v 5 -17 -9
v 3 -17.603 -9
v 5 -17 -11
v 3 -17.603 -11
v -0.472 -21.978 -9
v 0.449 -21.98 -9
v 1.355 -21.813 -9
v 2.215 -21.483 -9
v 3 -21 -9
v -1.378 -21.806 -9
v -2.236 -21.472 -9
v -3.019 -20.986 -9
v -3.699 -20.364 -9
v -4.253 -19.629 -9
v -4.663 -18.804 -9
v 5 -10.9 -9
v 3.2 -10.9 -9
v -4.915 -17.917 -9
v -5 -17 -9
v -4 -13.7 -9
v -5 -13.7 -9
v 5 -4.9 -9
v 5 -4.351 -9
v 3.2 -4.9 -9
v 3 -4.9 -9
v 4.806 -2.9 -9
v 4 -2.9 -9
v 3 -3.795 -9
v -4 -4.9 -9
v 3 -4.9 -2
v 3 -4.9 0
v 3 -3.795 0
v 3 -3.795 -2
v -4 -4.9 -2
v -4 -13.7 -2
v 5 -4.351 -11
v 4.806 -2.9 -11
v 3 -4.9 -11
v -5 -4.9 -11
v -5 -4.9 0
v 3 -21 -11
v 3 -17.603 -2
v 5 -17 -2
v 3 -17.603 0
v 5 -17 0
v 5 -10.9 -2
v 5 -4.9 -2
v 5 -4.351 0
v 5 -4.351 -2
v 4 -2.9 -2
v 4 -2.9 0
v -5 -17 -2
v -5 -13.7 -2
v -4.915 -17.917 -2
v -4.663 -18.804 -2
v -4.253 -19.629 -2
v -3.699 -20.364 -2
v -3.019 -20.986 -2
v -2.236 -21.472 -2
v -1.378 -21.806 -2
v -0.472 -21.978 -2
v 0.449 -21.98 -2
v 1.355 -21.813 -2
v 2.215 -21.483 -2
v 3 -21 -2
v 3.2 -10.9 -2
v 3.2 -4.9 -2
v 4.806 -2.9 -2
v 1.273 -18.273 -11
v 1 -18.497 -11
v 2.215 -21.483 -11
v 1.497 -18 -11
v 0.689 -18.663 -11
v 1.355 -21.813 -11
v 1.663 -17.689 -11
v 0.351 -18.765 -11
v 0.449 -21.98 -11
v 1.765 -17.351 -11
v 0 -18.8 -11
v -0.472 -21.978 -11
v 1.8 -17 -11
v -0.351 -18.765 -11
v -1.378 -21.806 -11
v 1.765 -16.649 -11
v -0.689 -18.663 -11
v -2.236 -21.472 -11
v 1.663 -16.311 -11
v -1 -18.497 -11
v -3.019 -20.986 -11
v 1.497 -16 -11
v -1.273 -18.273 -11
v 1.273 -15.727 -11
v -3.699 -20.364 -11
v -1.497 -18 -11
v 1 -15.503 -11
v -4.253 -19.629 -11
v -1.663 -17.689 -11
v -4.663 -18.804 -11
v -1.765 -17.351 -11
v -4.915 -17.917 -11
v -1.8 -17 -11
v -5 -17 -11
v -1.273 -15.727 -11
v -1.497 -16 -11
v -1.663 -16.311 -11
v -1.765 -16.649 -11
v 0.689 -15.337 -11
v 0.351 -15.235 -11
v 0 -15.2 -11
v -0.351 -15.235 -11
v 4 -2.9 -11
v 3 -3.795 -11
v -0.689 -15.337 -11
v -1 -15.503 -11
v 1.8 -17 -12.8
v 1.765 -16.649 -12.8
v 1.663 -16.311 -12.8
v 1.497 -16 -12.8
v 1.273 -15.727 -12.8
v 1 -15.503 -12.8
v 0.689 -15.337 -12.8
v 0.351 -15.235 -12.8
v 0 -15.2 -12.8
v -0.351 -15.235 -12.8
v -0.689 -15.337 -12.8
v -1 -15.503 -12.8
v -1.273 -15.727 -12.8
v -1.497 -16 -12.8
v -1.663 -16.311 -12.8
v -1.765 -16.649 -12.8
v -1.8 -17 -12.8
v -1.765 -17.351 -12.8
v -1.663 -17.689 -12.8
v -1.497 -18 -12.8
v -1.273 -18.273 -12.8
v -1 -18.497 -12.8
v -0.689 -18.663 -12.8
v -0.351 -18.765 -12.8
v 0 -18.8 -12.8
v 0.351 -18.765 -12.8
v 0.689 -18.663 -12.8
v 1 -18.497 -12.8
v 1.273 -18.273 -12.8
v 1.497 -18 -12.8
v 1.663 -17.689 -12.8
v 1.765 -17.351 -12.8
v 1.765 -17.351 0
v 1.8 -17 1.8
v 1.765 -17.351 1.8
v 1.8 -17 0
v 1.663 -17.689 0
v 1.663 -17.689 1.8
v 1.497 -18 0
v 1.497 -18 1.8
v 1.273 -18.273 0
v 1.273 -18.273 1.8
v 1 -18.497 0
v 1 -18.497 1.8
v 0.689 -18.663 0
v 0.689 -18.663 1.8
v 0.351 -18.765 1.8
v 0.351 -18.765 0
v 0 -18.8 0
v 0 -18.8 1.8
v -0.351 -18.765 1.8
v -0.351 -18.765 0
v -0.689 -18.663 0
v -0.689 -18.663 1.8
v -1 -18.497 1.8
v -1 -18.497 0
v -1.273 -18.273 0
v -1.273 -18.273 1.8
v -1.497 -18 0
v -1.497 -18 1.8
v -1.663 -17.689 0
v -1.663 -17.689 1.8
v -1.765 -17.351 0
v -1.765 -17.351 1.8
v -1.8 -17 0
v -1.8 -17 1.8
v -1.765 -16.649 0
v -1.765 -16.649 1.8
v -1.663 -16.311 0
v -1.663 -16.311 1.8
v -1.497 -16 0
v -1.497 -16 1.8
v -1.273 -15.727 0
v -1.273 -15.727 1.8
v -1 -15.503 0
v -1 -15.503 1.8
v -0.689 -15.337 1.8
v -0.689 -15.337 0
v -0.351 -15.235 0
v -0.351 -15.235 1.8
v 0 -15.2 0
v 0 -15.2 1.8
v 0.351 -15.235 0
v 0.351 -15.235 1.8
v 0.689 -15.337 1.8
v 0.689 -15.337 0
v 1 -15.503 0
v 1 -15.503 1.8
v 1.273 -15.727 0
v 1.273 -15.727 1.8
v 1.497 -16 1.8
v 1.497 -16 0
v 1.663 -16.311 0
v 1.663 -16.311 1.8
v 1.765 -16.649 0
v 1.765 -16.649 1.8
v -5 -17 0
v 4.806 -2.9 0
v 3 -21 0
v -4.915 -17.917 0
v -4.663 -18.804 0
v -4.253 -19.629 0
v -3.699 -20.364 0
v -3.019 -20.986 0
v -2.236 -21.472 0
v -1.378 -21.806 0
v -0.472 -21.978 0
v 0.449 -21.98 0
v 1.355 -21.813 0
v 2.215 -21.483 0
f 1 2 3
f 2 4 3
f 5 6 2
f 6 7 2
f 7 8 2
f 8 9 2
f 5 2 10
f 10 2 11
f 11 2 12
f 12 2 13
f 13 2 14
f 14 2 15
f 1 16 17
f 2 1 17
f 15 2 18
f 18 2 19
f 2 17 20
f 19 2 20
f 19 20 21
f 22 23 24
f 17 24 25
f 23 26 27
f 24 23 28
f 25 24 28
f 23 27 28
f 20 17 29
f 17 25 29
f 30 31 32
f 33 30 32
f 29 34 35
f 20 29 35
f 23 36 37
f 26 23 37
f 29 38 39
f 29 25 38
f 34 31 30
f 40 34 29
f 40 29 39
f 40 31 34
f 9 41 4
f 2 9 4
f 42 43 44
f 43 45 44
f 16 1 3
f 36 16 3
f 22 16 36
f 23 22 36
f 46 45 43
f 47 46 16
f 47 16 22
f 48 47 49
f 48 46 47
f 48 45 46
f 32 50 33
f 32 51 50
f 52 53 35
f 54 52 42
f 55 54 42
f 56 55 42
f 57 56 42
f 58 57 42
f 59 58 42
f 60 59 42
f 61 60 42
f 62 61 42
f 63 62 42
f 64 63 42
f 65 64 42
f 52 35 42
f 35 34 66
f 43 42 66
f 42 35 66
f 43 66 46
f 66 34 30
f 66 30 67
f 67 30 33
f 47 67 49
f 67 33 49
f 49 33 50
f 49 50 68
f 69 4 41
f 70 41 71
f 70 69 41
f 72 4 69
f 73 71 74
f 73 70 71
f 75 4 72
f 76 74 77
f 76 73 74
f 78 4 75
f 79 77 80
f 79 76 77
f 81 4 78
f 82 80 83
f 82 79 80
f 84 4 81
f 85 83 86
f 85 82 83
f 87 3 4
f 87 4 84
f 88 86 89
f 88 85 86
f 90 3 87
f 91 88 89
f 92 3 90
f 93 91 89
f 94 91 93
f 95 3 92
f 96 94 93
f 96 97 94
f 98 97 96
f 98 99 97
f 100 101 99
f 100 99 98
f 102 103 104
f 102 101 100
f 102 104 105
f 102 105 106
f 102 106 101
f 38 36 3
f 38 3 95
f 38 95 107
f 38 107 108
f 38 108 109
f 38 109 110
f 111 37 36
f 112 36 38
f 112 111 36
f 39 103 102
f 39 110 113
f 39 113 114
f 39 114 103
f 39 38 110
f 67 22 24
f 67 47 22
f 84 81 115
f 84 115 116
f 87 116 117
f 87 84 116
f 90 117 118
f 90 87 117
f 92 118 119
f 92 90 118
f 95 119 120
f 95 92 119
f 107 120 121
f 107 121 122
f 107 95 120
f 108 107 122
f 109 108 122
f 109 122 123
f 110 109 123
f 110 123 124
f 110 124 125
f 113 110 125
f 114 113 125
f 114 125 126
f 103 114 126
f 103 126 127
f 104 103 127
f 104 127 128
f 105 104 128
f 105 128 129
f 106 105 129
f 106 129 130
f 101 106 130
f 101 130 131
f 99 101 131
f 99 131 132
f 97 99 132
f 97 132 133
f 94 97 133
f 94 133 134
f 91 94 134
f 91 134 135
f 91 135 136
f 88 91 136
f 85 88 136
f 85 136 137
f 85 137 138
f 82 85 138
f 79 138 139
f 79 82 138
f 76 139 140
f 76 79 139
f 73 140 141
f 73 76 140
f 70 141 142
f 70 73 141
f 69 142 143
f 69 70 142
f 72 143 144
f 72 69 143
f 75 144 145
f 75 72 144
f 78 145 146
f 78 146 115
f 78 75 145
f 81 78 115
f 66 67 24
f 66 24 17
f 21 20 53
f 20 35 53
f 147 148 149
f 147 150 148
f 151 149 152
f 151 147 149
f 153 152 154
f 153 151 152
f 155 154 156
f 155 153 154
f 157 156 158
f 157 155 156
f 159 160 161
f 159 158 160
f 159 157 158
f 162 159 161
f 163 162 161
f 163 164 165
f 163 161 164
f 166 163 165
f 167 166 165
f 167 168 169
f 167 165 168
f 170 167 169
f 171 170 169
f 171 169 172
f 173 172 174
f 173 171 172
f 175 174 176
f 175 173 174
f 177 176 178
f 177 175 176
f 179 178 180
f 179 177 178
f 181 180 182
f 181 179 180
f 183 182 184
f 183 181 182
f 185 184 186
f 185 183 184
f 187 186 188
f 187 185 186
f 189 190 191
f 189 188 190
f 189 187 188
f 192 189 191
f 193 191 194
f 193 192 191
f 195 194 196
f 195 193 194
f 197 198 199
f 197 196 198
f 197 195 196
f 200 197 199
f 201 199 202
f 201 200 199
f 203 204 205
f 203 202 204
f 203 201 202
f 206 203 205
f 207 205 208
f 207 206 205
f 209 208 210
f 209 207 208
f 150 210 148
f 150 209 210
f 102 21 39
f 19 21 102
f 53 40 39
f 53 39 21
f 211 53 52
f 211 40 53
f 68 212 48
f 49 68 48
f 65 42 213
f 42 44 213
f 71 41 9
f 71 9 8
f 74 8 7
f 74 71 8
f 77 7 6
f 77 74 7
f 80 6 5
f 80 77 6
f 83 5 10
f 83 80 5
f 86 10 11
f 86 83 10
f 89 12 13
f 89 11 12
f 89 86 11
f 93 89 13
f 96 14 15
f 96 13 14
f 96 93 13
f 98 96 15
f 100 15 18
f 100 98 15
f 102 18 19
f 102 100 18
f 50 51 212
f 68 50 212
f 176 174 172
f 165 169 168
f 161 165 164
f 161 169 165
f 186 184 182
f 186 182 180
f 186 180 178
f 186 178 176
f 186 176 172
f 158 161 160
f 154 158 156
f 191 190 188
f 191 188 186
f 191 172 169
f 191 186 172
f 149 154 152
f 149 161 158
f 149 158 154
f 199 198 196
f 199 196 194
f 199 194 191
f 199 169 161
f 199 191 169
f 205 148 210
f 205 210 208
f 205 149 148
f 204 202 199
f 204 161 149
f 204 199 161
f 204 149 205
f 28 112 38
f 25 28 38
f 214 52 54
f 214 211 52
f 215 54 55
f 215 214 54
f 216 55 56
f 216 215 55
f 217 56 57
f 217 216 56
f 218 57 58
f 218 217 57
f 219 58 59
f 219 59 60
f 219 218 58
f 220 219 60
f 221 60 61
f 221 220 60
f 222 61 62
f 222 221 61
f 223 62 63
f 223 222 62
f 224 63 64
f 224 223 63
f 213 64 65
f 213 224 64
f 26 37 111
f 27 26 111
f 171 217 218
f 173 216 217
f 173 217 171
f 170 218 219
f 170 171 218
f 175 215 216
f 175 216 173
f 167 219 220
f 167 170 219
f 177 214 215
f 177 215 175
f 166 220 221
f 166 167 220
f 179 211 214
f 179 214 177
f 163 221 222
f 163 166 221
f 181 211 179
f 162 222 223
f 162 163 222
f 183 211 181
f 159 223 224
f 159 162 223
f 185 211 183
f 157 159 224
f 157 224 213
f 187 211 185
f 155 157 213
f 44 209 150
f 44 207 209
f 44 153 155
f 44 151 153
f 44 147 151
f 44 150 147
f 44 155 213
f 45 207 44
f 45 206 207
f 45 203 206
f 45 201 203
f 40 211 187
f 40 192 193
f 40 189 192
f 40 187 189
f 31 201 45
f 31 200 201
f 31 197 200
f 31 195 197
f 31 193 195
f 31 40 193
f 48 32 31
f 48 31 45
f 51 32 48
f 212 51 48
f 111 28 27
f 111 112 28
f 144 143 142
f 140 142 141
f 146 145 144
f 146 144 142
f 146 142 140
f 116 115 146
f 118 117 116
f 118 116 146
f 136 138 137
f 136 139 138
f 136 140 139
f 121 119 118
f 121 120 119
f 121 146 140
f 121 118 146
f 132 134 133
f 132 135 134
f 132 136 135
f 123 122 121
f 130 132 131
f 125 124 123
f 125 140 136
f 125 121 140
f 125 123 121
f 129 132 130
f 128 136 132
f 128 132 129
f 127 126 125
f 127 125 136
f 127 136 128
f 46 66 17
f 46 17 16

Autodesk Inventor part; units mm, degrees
ref_plane "YZ Plane" through (0, 0, 0) normal (1, 0, 0) x (0, 1, 0)
ref_plane "XZ Plane" through (0, 0, 0) normal (0, 1, 0) x (-1, 0, 0)
ref_plane "XY Plane" through (0, 0, 0) normal (0, 0, 1) x (1, 0, 0)
sketch "Skizze1" plane through (0, 0, 0) normal (0, 0, 1) x (1, 0, 0)
  arc A0 (5, -17) -> (-5, -17) centre (0, -17) ccw construction
  arc A1 (-5, -17) -> (3, -21) centre (0, -17) ccw
  circle A2 centre (0, -17) radius 1.75 construction
  line L0 (0, -22) -> (0, -4.9) construction
  line L1 (5, -17) -> (5, -4.9)
  line L2 (3, -4.9) -> (-5, -4.9)
  line L3 (-5, -4.9) -> (-5, -17)
  line L4 (0, -17) -> (3, -17) construction
  line L5 (3, -17.6027) -> (3, -21)
  line L6 (3, -17) -> (5, -17) construction
  line L7 (5, -17) -> (3, -17.6027)
  line L8 (3, -4.9) -> (3, -3.7947)
  line L9 (4, -2.9) -> (4.8065, -2.9)
  line L10 (5, -4.3512) -> (5, -4.9)
  line L11 (4, -2.9) -> (3, -3.7947)
  line L12 (4.8065, -2.9) -> (5, -4.3512)
  point P0 (0, 0)
  dimension "d0" = 3.5
  dimension "d1" = 17.1
  dimension "d2" = 3
extrude "Extrusion1" add sketch "Skizze1" against normal blind 2
sketch "Skizze2" plane through (0, 0, 0) normal (0, 0, 1) x (1, 0, 0)
  arc A0 (-5, -17) -> (3, -21) centre (0, -17) ccw projected
  circle A1 centre (0, -17) radius 1.8
  point P0 (0, 0)
  dimension "d7" = 3.6
extrude "Extrusion2" add sketch "Skizze2" along normal blind 1.8
sketch "Skizze4" plane through (0, 0, -2) normal (0, 0, -1) x (-1, 0, 0)
  line L0 (-5, -4.3512) -> (-5, -17) construction
  line L1 (-5, -17) -> (-3, -17.6027) construction
  line L2 (-3, -17.6027) -> (-3, -21) construction
  arc A0 (-3, -21) -> (5, -17) centre (0, -17) ccw construction
  line L3 (5, -17) -> (5, -4.9) construction
  line L4 (5, -4.9) -> (-3, -4.9) construction
  line L5 (-3, -4.9) -> (-3, -3.7947) construction
  line L6 (-3, -3.7947) -> (-4, -2.9) construction
  line L7 (-4, -2.9) -> (-4.8065, -2.9) construction
  line L8 (-4.8065, -2.9) -> (-5, -4.3512) construction
  line L9 (-5, -4.3512) -> (-5, -17) construction
  line L10 (-5, -4.9) -> (-3.2, -4.9)
  line L11 (-3.2, -4.9) -> (-3.2, -10.9)
  line L12 (-3.2, -10.9) -> (-5, -10.9)
  line L13 (-5, -10.9) -> (-5, -4.9)
  line L14 (-3, -4.9) -> (5, -4.9) construction
  line L15 (5, -4.9) -> (4, -4.9)
  line L16 (4, -4.9) -> (4, -13.7)
  line L17 (4, -13.7) -> (5, -13.7)
  line L18 (5, -13.7) -> (5, -4.9)
  point P0 (0, 0)
  dimension "d10" = 1.8
  dimension "d11" = 6
  dimension "d12" = 1
  dimension "d13" = 8.8
extrude "Extrusion3" add sketch "Skizze4" along normal blind 3.5
mirror "Spiegeln3" about plane through (4.1, -7.9, -5.5) normal (0, 0, -1) of "Extrusion2", "Extrusion1", "Extrusion3"
properties part number "chain_elmt_2"
